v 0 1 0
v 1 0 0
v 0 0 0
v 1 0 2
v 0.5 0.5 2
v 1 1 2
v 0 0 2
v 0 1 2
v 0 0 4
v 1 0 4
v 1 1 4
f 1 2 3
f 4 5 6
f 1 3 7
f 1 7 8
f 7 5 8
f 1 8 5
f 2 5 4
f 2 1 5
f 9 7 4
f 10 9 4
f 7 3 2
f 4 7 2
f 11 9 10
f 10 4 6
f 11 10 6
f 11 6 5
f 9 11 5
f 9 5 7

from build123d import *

# Parameters (mm, degrees)
BOSS_EXTRUDE1_DEPTH = 2
BOSS_EXTRUDE2_DEPTH = 2


with BuildPart() as part:
    # Sketch1 → Boss-Extrude1 (new body)
    with BuildSketch(Plane.XY):
        Polygon((0, 0), (0, 1), (1, 0), align=None)
    extrude(amount=BOSS_EXTRUDE1_DEPTH)

    # Sketch2 → Boss-Extrude2 (add)
    with BuildSketch(Plane.XY.offset(2)):
        Polygon((1, 0), (1, 1), (0, 0), align=None)
    extrude(amount=BOSS_EXTRUDE2_DEPTH)


solid = part.part
